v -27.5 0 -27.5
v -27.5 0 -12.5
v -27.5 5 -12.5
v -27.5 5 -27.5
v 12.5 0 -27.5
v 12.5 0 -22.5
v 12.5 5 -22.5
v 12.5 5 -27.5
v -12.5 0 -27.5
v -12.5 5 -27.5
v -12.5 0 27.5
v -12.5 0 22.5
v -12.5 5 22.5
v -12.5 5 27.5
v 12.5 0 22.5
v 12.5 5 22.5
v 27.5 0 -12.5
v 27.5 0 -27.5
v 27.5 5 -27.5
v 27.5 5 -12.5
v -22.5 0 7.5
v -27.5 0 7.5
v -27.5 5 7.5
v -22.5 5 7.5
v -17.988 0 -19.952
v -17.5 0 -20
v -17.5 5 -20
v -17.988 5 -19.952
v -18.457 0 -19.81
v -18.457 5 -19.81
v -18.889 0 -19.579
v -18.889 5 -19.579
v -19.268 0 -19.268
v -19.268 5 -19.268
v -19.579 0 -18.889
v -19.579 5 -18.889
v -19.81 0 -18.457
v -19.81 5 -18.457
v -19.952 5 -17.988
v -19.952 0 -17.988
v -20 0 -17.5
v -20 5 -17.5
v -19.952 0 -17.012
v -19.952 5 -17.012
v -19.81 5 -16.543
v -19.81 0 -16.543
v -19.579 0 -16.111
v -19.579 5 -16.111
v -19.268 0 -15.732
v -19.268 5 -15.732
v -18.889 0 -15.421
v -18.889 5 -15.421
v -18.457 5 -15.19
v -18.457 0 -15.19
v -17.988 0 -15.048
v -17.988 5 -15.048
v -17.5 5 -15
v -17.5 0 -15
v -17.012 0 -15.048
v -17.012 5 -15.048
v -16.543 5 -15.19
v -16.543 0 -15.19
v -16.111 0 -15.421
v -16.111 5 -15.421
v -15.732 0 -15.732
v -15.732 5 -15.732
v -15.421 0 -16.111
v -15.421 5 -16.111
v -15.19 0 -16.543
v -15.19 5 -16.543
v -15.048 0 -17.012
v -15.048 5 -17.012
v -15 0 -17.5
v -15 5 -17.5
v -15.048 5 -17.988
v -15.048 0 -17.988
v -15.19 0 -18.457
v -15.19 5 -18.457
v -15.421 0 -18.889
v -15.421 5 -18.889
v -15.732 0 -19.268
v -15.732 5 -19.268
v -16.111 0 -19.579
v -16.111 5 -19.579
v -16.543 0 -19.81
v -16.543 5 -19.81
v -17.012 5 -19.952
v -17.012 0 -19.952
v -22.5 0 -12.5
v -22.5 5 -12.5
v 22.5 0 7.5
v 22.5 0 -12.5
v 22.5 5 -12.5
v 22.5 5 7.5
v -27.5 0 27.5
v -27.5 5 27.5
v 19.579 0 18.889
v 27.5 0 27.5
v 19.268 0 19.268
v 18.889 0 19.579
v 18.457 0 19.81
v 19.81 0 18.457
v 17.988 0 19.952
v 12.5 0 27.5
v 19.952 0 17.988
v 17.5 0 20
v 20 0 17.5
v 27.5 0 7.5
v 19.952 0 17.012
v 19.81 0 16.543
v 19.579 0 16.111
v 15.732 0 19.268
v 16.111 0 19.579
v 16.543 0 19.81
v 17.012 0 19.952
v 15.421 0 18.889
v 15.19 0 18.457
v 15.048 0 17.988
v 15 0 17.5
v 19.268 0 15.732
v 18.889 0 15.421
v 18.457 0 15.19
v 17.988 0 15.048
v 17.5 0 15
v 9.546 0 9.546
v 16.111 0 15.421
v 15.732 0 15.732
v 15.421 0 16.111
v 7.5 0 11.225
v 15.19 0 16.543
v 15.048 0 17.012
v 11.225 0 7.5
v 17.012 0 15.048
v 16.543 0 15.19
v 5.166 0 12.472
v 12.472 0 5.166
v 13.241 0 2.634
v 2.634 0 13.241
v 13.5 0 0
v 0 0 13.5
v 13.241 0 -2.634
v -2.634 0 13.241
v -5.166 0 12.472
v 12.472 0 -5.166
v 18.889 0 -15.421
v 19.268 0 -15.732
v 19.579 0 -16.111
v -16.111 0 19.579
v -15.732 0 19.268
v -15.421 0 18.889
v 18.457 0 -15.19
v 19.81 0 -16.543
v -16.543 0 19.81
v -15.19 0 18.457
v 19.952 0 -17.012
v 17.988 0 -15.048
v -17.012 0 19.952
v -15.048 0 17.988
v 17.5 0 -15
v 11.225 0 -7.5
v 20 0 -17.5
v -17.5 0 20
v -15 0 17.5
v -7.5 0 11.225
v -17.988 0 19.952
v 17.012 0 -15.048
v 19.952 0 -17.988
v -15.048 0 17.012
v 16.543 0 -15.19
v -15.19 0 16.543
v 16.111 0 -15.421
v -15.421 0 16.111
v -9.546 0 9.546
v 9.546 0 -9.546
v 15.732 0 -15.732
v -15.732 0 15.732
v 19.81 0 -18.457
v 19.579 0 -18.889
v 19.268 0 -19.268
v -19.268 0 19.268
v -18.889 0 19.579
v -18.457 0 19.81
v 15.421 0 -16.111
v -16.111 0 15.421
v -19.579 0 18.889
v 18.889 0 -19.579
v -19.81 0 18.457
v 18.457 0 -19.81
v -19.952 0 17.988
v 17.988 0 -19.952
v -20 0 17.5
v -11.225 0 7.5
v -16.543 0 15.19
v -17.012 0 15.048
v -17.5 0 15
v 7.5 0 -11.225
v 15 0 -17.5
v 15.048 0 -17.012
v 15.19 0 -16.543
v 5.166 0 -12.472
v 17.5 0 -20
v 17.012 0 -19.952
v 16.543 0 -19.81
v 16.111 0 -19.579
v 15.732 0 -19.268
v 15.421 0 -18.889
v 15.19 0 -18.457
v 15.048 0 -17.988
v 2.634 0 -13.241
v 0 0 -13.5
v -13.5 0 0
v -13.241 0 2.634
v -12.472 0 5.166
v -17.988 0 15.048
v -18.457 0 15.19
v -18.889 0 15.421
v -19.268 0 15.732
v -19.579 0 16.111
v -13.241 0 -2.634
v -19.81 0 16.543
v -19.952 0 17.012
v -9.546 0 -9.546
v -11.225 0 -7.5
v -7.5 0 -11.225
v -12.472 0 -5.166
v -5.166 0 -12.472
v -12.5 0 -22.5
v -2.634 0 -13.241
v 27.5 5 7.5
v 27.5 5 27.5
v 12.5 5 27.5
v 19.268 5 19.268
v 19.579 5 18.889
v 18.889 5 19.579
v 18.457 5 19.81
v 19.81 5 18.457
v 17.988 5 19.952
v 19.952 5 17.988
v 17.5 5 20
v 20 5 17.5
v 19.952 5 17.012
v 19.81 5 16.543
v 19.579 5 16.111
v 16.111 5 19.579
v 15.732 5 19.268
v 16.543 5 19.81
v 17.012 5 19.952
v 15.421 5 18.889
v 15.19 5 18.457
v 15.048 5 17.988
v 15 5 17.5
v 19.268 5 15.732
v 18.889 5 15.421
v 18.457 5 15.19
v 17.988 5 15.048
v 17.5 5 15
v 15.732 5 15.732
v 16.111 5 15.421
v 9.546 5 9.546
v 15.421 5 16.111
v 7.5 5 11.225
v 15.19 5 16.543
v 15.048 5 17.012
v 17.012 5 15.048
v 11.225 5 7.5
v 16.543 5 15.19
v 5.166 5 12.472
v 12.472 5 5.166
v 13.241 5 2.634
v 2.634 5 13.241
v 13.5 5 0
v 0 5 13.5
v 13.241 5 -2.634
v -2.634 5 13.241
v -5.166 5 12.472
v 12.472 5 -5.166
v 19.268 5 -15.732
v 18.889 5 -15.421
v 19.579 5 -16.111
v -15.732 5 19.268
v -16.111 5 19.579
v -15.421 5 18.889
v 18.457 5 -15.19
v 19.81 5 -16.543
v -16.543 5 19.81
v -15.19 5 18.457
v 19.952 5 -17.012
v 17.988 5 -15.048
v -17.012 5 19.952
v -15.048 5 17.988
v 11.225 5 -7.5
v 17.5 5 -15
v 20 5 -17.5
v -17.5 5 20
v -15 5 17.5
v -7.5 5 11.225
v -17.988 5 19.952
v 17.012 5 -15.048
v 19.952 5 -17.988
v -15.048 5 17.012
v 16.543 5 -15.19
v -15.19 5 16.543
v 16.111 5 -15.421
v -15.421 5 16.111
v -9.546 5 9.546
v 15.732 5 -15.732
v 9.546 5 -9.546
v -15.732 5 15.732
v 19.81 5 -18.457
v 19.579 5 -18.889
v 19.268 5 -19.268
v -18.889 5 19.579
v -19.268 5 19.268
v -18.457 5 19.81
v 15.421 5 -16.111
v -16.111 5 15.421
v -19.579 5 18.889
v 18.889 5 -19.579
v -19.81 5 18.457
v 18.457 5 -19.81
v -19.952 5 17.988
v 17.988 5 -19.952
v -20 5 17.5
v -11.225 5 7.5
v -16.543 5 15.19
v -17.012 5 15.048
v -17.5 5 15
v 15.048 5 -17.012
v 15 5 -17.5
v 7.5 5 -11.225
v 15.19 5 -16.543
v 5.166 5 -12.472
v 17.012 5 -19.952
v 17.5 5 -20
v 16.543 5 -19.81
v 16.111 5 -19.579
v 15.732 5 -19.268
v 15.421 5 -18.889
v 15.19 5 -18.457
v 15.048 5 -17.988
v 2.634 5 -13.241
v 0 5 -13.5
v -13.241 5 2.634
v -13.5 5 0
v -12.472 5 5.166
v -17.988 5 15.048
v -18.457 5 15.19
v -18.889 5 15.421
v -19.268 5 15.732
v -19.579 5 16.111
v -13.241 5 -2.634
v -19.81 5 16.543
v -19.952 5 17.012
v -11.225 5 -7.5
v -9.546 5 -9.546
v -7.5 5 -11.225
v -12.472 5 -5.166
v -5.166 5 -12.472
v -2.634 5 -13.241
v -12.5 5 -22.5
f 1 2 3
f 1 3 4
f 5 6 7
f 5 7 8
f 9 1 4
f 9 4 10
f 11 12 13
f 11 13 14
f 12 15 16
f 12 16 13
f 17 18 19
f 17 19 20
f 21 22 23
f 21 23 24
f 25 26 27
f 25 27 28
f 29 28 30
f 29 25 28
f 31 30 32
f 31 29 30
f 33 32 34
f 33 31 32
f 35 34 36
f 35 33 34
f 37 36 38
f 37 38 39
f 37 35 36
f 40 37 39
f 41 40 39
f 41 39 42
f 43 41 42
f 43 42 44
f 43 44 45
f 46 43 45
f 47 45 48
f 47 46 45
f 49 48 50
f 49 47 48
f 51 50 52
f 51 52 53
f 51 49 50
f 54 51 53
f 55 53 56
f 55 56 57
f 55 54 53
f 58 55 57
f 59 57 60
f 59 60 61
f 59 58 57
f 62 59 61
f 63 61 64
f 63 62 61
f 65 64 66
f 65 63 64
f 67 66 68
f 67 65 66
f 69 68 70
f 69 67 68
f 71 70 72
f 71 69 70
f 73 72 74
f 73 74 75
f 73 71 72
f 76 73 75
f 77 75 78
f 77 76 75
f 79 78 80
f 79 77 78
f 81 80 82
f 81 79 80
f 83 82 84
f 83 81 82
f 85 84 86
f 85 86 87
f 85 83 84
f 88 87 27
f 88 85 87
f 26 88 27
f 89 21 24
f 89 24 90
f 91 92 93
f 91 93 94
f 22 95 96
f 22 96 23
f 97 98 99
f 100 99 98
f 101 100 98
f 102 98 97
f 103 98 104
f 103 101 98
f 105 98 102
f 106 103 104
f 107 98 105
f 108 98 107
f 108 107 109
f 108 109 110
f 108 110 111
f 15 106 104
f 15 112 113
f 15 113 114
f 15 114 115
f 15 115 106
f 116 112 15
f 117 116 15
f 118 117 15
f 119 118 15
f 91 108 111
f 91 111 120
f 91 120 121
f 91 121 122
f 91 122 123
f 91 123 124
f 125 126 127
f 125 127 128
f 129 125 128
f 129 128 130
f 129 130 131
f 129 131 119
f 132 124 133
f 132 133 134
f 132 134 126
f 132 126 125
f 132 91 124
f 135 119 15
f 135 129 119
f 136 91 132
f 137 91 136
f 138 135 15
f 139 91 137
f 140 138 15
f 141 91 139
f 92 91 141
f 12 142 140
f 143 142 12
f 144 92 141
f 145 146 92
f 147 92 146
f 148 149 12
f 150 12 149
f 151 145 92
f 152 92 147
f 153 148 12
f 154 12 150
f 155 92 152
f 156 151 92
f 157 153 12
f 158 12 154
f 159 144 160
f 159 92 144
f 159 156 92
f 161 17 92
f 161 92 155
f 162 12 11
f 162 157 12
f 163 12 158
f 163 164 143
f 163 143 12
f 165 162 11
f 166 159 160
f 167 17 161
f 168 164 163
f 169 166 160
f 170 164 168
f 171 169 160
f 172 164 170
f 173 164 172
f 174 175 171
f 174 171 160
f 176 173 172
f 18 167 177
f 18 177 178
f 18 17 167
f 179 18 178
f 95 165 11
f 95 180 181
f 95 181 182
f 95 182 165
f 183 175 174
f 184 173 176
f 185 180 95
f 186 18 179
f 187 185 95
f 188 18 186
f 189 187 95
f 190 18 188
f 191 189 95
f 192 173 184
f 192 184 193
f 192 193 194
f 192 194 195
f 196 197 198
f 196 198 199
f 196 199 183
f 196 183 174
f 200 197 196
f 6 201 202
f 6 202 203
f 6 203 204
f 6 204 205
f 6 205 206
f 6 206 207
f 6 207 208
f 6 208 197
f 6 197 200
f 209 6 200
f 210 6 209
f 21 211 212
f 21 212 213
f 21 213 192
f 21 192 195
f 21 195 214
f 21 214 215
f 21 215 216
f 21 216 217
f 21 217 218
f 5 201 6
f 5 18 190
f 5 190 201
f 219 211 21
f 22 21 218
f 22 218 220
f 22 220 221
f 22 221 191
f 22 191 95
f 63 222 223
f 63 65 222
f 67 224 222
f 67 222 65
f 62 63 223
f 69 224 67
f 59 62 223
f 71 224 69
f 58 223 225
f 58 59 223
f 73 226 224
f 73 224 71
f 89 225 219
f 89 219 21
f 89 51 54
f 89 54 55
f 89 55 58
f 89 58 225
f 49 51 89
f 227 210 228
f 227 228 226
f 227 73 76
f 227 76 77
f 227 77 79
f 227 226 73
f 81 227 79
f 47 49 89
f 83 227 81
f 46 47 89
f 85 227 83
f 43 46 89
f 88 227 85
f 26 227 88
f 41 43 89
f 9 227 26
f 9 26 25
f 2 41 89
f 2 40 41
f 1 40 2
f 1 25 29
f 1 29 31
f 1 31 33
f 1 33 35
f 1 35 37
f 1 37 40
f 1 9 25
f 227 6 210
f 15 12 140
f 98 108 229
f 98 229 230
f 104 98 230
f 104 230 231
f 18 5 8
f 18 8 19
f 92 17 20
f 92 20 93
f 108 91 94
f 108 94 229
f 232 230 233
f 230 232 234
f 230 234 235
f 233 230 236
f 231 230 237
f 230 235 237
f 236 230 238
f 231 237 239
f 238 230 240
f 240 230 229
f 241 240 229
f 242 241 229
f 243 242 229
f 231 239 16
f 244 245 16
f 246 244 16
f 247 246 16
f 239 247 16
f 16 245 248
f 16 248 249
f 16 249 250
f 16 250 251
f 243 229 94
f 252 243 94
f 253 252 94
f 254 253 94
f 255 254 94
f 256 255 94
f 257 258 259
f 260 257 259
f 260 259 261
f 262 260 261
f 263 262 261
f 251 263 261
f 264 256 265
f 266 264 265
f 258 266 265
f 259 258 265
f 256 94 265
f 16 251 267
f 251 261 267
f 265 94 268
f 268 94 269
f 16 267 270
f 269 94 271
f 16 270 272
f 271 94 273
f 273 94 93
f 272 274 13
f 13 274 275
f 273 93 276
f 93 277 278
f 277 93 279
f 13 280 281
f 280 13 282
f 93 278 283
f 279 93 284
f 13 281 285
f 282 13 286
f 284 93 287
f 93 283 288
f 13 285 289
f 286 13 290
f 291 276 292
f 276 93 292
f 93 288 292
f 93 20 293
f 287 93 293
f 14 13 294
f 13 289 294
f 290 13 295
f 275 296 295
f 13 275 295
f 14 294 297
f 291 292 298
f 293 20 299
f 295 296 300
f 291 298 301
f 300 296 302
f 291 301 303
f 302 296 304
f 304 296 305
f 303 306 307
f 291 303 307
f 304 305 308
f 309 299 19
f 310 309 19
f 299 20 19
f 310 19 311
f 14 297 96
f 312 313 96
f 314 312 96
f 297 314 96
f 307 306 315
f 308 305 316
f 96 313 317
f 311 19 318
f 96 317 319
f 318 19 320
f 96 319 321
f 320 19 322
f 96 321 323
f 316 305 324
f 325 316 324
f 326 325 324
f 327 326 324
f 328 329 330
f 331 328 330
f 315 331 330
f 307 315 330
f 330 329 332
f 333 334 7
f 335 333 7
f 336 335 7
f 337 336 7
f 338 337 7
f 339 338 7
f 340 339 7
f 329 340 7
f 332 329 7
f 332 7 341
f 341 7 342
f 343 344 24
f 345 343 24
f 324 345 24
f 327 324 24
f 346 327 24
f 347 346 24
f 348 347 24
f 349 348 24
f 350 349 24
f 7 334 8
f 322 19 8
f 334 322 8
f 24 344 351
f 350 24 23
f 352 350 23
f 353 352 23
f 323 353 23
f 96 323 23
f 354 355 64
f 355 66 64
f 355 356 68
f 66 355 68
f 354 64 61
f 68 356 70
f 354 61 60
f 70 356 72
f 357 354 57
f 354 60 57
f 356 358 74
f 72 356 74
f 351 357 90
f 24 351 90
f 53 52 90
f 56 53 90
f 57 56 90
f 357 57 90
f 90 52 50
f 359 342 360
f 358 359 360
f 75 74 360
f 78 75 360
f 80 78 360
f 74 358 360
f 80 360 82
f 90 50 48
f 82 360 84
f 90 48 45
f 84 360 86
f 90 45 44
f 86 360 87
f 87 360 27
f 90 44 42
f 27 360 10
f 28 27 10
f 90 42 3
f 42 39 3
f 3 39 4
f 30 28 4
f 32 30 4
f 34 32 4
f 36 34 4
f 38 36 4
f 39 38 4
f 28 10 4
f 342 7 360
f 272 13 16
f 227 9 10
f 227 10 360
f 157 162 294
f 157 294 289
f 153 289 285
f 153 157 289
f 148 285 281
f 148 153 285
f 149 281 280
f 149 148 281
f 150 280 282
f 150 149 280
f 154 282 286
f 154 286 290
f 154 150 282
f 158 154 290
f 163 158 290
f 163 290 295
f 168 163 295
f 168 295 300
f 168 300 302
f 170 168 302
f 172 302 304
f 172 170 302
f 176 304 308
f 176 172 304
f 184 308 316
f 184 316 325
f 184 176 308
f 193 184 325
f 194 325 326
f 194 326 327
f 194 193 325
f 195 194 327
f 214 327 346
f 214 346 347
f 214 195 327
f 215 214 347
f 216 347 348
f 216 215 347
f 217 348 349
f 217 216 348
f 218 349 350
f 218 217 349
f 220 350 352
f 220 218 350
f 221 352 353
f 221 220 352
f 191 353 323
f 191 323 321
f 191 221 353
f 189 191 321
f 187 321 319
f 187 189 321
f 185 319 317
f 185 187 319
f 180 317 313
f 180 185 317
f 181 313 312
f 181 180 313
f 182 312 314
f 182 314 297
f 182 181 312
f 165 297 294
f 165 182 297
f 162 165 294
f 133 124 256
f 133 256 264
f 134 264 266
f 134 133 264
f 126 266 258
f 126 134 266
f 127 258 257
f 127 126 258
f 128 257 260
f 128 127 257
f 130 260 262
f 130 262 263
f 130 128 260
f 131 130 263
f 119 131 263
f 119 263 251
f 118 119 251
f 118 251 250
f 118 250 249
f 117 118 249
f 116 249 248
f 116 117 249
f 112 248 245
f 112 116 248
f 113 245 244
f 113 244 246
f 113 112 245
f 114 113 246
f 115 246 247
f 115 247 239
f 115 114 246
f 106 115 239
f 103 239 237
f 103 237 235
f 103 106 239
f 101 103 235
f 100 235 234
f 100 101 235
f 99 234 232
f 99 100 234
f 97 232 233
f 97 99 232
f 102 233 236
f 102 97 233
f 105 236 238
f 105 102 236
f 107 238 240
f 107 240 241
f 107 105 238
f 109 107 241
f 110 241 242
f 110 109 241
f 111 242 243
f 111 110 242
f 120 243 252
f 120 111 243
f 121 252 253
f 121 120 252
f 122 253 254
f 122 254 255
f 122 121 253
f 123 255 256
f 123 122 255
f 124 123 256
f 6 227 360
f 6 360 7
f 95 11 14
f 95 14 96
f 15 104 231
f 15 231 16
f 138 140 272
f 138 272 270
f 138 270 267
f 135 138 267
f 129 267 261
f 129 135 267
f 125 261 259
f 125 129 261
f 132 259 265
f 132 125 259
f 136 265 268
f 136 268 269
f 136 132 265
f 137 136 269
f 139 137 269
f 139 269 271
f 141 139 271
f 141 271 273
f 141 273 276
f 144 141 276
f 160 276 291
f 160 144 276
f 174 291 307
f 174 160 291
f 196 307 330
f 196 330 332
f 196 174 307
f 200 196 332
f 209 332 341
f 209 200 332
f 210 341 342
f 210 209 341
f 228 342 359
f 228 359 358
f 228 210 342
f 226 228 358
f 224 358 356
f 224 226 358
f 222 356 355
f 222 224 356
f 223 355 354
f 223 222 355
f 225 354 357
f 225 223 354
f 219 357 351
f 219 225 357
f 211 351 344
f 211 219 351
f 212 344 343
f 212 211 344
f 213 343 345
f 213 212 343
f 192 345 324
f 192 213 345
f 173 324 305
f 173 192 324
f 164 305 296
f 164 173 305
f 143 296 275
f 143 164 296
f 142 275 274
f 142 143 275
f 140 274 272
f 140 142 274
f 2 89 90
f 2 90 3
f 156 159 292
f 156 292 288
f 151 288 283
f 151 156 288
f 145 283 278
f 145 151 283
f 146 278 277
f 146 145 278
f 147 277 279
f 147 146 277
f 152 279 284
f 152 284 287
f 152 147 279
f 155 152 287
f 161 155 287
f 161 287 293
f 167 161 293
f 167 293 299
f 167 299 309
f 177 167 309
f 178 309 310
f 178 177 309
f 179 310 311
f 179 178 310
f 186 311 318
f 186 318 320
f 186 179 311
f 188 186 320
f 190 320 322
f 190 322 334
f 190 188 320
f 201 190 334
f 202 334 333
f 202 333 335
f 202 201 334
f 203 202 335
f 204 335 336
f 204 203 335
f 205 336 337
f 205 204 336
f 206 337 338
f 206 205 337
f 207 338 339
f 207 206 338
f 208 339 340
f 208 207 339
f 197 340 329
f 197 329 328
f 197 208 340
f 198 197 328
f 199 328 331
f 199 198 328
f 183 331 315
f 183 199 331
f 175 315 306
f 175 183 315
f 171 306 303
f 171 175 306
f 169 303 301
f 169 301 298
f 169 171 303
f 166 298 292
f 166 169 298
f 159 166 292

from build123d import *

# Parameters (mm, degrees)
ESQUISSE1_R        = 2.5
ESQUISSE1_R_2      = 13.5
BOSS_EXTRU_1_DEPTH = 5


with BuildPart() as part:
    # Esquisse1 → Boss.-Extru.1 (new body)
    with BuildSketch(Plane(origin=(0, 0, 0), x_dir=(1, 0, 0), z_dir=(0, 1, 0))):
        Polygon((-12.5, 27.5), (-12.5, 22.5), (12.5, 22.5), (12.5, 27.5), (27.5, 27.5), (27.5, 12.5), (22.5, 12.5), (22.5, -7.5), (27.5, -7.5), (27.5, -27.5), (12.5, -27.5), (12.5, -22.5), (-12.5, -22.5), (-12.5, -27.5), (-27.5, -27.5), (-27.5, -7.5), (-22.5, -7.5), (-22.5, 12.5), (-27.5, 12.5), (-27.5, 27.5), align=None)
        with Locations(Location((17.5, 17.5, 0), (0, 0, 270))):
            Circle(ESQUISSE1_R, mode=Mode.SUBTRACT)
        with Locations(Location((-17.5, 17.5, 0), (0, 0, 90))):
            Circle(ESQUISSE1_R, mode=Mode.SUBTRACT)
        with Locations(Location((-17.5, -17.5, 0), (0, 0, 270))):
            Circle(ESQUISSE1_R, mode=Mode.SUBTRACT)
        with Locations(Location((17.5, -17.5, 0), (0, 0, 90))):
            Circle(ESQUISSE1_R, mode=Mode.SUBTRACT)
        with Locations(Location((0, 0, 0), (0, 0, 270))):
            Circle(ESQUISSE1_R_2, mode=Mode.SUBTRACT)
    extrude(amount=BOSS_EXTRU_1_DEPTH)


solid = part.part
